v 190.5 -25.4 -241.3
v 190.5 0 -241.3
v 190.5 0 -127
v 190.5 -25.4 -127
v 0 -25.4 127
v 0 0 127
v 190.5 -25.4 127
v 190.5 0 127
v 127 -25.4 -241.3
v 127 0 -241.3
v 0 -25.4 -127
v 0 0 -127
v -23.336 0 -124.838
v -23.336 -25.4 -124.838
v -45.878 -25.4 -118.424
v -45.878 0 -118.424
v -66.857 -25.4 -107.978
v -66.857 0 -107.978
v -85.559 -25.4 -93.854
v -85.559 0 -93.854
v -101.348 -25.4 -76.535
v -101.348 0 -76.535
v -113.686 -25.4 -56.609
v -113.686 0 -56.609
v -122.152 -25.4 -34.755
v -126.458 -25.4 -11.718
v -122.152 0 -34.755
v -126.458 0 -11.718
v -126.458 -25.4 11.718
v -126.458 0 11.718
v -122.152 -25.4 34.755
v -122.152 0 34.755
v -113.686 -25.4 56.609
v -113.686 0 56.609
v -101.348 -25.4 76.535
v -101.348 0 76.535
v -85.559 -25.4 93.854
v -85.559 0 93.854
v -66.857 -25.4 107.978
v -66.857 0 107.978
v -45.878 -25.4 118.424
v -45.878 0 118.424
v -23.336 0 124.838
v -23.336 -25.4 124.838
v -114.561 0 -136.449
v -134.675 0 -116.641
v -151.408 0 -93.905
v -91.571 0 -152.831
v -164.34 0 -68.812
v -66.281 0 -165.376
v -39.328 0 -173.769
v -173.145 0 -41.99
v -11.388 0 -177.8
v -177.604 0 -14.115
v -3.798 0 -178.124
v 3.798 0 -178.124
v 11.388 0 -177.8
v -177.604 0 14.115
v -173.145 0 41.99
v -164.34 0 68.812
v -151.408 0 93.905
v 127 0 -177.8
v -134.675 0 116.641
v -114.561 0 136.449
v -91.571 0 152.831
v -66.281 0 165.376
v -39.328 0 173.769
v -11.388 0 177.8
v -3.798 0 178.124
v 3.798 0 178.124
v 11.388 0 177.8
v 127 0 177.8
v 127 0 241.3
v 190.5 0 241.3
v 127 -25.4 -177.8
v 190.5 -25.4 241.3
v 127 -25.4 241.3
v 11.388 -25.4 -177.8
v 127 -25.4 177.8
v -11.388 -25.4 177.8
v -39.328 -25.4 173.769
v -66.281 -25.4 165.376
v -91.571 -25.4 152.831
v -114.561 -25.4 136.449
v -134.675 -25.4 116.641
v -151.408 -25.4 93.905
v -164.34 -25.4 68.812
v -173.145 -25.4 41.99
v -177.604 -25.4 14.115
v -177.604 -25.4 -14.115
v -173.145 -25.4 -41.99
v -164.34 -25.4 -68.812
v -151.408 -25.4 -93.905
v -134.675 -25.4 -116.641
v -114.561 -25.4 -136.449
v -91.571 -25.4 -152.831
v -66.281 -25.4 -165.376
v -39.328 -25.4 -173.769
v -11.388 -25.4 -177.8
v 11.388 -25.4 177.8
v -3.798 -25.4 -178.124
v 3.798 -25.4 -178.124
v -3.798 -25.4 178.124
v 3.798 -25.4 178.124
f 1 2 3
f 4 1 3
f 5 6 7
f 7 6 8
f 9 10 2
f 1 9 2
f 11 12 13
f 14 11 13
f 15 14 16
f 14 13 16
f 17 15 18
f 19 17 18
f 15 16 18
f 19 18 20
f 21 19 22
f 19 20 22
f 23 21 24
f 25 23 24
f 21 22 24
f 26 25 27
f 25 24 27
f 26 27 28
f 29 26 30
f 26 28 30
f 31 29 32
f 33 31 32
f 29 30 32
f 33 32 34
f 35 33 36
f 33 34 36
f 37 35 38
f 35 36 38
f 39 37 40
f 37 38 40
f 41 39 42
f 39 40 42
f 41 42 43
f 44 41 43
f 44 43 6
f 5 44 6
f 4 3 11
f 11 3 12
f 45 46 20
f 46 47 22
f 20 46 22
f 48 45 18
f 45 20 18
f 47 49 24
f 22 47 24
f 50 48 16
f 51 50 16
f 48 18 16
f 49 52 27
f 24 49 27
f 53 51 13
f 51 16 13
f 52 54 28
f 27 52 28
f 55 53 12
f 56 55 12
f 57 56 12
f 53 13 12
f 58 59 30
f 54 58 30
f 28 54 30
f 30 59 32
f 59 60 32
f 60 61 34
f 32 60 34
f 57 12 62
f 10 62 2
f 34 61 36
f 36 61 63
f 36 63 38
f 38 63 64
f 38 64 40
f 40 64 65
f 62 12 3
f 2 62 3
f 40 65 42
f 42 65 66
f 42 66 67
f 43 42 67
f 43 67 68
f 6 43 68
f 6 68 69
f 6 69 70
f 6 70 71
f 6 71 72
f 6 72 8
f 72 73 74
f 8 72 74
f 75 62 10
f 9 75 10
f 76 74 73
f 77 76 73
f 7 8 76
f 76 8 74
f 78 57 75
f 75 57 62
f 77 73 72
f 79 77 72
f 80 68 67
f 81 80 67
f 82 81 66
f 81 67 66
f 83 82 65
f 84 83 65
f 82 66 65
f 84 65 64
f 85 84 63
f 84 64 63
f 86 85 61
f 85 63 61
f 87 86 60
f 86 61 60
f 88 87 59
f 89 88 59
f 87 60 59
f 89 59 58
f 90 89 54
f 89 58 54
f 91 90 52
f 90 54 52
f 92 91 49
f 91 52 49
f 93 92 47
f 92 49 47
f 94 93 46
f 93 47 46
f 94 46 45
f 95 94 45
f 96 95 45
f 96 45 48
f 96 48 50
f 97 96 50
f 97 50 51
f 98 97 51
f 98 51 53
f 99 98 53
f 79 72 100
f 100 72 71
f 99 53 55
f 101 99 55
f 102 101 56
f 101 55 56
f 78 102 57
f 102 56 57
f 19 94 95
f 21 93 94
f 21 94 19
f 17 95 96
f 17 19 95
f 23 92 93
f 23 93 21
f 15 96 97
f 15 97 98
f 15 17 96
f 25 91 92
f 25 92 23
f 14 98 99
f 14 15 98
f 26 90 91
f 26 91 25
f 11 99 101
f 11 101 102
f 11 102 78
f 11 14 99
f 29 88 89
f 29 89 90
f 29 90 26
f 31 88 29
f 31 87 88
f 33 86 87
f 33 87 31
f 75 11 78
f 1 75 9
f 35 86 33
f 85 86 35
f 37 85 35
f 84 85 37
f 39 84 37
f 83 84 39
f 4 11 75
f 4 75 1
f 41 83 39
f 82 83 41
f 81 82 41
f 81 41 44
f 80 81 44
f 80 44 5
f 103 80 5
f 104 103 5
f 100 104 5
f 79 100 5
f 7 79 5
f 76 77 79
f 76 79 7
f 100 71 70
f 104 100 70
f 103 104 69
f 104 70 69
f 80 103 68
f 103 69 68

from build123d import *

# Parameters (mm, degrees)
F1_DEPTH = 25.4


with BuildPart() as f1:
    # F0 (on Front) → F1 (new body)
    with BuildSketch(Plane.XZ):
        with BuildLine():
            Line((-11.387531, 177.8), (11.387531, 177.8))
            ThreePointArc((11.387531, 177.8), (0, 178.164295), (-11.387531, 177.8))
        make_face()
        with BuildLine():
            Line((11.387531, -177.8), (-11.387531, -177.8))
            ThreePointArc((-11.387531, -177.8), (0, -178.164295), (11.387531, -177.8))
        make_face()
        with BuildLine():
            Line((127, 241.3), (127, 177.8))
            Line((127, 177.8), (11.387531, 177.8))
            Line((11.387531, 177.8), (-11.387531, 177.8))
            ThreePointArc((-11.387531, 177.8), (-178.164295, 0), (-11.387531, -177.8))
            Line((-11.387531, -177.8), (11.387531, -177.8))
            Line((11.387531, -177.8), (127, -177.8))
            Line((127, -177.8), (127, -241.3))
            Line((127, -241.3), (190.5, -241.3))
            Line((190.5, -241.3), (190.5, -177.8))
            Line((190.5, -177.8), (190.5, -127))
            Line((190.5, -127), (127, -127))
            Line((127, -127), (0, -127))
            ThreePointArc((0, -127), (-127, 0), (0, 127))
            Line((0, 127), (127, 127))
            Line((127, 127), (190.5, 127))
            Line((190.5, 127), (190.5, 177.8))
            Line((190.5, 177.8), (190.5, 241.3))
            Line((190.5, 241.3), (127, 241.3))
        make_face()
    extrude(amount=F1_DEPTH)


solid = f1.part
